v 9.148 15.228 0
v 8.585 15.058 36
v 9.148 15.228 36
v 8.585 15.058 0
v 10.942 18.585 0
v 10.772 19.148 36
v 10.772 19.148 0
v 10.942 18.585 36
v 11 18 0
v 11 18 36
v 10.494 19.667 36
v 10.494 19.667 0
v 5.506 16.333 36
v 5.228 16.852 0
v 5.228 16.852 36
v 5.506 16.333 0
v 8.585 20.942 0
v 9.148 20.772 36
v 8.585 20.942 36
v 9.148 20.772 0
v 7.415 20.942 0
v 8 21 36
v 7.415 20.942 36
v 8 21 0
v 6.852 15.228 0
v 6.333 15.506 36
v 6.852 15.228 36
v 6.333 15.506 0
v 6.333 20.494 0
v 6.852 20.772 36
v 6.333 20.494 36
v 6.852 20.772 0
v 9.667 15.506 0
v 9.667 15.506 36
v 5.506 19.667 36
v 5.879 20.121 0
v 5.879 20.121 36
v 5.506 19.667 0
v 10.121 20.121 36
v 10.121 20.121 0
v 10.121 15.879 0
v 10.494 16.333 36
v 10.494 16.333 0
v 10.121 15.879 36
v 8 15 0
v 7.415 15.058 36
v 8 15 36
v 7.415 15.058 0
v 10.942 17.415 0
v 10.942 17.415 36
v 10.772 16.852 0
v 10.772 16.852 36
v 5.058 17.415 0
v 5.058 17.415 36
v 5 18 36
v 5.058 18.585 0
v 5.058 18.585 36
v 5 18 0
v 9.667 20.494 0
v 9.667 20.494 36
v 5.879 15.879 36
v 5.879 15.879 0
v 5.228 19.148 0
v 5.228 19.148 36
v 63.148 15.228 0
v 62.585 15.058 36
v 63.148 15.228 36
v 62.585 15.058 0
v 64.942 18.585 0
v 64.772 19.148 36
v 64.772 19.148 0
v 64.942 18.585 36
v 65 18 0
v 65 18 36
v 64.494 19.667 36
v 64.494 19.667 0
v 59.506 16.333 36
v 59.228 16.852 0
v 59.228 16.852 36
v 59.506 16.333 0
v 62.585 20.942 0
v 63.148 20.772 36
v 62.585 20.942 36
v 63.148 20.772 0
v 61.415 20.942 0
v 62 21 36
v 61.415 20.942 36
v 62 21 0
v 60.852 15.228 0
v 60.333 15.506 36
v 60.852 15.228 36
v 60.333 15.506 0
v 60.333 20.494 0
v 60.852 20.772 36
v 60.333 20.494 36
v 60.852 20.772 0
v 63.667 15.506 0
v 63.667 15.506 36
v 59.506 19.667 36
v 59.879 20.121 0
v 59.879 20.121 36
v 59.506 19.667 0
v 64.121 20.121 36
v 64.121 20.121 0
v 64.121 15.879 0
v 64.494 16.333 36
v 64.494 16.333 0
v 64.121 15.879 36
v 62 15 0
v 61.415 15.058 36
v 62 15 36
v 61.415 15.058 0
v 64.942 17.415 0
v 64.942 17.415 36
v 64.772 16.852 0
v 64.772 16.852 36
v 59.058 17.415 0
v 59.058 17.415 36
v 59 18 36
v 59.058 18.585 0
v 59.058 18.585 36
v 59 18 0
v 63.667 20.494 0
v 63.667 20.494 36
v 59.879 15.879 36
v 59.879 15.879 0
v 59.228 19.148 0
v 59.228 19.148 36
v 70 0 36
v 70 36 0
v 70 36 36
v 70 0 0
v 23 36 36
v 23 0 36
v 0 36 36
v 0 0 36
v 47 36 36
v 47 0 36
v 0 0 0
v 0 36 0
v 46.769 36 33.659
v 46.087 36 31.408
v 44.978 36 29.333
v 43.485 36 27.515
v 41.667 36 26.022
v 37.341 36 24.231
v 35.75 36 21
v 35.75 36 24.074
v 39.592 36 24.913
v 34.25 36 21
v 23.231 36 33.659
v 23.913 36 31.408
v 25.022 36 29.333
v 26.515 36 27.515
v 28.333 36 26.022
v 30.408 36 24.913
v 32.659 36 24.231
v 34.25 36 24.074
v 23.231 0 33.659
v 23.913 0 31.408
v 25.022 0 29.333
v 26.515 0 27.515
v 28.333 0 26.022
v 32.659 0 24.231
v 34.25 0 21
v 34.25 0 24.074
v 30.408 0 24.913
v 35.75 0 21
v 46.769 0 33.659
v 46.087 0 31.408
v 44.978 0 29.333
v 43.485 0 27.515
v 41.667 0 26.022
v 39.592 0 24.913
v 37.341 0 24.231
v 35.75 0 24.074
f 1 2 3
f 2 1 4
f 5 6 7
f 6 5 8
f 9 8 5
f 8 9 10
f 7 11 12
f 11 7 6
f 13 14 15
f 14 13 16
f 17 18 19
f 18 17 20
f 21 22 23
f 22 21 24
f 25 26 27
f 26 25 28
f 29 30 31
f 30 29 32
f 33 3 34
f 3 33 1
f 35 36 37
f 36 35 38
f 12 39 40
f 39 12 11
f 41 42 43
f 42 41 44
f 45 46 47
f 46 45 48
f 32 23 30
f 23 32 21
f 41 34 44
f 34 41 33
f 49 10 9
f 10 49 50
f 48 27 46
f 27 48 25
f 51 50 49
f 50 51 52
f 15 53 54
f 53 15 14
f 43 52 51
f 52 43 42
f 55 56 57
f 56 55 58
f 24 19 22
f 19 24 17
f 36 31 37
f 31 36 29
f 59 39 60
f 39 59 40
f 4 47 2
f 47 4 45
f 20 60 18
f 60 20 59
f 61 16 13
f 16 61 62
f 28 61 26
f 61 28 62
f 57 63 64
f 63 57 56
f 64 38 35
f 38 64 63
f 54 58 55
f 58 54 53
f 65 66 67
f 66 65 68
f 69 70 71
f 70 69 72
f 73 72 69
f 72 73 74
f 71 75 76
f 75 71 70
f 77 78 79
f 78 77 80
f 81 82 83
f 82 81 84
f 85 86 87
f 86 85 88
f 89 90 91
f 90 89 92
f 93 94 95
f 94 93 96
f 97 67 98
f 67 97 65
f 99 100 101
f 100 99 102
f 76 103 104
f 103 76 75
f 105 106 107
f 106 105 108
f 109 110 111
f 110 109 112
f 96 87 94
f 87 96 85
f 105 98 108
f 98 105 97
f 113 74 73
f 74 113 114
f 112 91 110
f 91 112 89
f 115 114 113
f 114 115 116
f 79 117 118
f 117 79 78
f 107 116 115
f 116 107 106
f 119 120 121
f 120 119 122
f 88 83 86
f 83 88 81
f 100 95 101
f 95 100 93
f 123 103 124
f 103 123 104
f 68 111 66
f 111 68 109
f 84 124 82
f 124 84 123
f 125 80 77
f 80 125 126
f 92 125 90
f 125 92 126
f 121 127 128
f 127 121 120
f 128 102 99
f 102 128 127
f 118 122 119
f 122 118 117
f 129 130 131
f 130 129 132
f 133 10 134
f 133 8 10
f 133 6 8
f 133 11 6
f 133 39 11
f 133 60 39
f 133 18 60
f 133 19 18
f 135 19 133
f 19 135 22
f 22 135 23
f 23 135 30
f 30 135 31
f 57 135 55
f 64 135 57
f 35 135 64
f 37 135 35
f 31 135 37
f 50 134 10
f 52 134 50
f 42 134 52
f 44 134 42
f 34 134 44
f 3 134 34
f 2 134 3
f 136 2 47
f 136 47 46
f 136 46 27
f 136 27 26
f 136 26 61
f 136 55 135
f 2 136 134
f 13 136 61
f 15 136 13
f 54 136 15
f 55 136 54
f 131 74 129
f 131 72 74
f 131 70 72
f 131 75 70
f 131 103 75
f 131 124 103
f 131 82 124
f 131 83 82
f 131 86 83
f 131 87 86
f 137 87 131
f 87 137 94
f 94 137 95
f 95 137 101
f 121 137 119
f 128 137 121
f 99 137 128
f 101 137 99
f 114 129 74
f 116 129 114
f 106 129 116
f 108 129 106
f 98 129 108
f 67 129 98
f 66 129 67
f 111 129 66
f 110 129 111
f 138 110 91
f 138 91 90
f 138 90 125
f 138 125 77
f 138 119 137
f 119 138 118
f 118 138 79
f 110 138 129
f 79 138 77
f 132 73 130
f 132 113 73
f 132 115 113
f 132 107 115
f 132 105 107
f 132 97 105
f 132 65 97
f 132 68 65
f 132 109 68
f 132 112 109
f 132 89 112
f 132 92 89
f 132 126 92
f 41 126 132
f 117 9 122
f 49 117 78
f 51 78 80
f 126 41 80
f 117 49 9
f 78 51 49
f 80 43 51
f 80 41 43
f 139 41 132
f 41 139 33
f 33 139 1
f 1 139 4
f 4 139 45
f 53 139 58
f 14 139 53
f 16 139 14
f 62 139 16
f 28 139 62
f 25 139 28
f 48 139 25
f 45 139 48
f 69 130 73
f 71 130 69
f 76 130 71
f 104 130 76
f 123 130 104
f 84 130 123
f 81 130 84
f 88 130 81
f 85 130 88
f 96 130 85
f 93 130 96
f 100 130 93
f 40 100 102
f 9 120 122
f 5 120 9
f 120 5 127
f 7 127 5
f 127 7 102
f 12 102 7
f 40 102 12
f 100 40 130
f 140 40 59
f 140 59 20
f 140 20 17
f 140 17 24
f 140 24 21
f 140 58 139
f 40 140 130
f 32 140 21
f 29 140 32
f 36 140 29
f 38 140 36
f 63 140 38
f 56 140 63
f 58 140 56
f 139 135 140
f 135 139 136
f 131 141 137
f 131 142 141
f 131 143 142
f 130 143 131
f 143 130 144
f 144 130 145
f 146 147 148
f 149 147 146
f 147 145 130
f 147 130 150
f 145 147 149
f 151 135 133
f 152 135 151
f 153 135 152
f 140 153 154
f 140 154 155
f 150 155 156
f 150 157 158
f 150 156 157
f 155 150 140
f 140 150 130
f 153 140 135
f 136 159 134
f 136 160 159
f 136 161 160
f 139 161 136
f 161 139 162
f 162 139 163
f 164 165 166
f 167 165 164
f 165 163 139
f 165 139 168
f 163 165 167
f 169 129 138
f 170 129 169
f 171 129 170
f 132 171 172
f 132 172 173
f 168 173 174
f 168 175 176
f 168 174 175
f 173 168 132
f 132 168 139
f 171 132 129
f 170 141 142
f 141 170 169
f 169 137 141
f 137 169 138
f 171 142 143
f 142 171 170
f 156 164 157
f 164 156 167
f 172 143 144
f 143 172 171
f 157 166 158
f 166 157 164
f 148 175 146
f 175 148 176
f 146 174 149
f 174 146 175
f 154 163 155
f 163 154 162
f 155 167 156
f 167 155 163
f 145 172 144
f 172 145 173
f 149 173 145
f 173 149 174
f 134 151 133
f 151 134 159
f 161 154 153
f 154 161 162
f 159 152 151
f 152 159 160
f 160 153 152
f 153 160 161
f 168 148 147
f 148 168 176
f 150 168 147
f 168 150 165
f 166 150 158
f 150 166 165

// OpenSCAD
$fn = 32;

// ----------------------------------------------------------------------
// Saddle clamp: split shaft clamp
// ----------------------------------------------------------------------

// --- parameters (mm) ---
blk_l = 70;               // block length, X
blk_w = 36;               // block width, Y
blk_h = 36;               // block height
clamp_r = 12;             // shaft groove radius
hole_r = 3;               // bolt hole radius
hole_m = 8;               // bolt hole margin from the ends
saw_w = 1.5;              // saw kerf width
fit_tol = 0.05;           // tolerance for press fits, mm
free_tol = 0.3;           // tolerance for clearance fits, mm

saw_depth = clamp_r + 3;  // saw kerf depth

difference() {
  cube([blk_l, blk_w, blk_h]);
  translate([blk_l / 2, -1, blk_h])
    rotate([-90, 0, 0])
      cylinder(h = blk_w + 2, r = clamp_r);
  for (sx = [0, 1])
    translate([sx ? blk_l - hole_m : hole_m, blk_w / 2, -1])
      cylinder(r = hole_r, h = blk_h + 2);
  translate([blk_l / 2 - saw_w / 2, -1, blk_h - saw_depth])
    cube([saw_w, blk_w + 2, saw_depth + 1]);
}
